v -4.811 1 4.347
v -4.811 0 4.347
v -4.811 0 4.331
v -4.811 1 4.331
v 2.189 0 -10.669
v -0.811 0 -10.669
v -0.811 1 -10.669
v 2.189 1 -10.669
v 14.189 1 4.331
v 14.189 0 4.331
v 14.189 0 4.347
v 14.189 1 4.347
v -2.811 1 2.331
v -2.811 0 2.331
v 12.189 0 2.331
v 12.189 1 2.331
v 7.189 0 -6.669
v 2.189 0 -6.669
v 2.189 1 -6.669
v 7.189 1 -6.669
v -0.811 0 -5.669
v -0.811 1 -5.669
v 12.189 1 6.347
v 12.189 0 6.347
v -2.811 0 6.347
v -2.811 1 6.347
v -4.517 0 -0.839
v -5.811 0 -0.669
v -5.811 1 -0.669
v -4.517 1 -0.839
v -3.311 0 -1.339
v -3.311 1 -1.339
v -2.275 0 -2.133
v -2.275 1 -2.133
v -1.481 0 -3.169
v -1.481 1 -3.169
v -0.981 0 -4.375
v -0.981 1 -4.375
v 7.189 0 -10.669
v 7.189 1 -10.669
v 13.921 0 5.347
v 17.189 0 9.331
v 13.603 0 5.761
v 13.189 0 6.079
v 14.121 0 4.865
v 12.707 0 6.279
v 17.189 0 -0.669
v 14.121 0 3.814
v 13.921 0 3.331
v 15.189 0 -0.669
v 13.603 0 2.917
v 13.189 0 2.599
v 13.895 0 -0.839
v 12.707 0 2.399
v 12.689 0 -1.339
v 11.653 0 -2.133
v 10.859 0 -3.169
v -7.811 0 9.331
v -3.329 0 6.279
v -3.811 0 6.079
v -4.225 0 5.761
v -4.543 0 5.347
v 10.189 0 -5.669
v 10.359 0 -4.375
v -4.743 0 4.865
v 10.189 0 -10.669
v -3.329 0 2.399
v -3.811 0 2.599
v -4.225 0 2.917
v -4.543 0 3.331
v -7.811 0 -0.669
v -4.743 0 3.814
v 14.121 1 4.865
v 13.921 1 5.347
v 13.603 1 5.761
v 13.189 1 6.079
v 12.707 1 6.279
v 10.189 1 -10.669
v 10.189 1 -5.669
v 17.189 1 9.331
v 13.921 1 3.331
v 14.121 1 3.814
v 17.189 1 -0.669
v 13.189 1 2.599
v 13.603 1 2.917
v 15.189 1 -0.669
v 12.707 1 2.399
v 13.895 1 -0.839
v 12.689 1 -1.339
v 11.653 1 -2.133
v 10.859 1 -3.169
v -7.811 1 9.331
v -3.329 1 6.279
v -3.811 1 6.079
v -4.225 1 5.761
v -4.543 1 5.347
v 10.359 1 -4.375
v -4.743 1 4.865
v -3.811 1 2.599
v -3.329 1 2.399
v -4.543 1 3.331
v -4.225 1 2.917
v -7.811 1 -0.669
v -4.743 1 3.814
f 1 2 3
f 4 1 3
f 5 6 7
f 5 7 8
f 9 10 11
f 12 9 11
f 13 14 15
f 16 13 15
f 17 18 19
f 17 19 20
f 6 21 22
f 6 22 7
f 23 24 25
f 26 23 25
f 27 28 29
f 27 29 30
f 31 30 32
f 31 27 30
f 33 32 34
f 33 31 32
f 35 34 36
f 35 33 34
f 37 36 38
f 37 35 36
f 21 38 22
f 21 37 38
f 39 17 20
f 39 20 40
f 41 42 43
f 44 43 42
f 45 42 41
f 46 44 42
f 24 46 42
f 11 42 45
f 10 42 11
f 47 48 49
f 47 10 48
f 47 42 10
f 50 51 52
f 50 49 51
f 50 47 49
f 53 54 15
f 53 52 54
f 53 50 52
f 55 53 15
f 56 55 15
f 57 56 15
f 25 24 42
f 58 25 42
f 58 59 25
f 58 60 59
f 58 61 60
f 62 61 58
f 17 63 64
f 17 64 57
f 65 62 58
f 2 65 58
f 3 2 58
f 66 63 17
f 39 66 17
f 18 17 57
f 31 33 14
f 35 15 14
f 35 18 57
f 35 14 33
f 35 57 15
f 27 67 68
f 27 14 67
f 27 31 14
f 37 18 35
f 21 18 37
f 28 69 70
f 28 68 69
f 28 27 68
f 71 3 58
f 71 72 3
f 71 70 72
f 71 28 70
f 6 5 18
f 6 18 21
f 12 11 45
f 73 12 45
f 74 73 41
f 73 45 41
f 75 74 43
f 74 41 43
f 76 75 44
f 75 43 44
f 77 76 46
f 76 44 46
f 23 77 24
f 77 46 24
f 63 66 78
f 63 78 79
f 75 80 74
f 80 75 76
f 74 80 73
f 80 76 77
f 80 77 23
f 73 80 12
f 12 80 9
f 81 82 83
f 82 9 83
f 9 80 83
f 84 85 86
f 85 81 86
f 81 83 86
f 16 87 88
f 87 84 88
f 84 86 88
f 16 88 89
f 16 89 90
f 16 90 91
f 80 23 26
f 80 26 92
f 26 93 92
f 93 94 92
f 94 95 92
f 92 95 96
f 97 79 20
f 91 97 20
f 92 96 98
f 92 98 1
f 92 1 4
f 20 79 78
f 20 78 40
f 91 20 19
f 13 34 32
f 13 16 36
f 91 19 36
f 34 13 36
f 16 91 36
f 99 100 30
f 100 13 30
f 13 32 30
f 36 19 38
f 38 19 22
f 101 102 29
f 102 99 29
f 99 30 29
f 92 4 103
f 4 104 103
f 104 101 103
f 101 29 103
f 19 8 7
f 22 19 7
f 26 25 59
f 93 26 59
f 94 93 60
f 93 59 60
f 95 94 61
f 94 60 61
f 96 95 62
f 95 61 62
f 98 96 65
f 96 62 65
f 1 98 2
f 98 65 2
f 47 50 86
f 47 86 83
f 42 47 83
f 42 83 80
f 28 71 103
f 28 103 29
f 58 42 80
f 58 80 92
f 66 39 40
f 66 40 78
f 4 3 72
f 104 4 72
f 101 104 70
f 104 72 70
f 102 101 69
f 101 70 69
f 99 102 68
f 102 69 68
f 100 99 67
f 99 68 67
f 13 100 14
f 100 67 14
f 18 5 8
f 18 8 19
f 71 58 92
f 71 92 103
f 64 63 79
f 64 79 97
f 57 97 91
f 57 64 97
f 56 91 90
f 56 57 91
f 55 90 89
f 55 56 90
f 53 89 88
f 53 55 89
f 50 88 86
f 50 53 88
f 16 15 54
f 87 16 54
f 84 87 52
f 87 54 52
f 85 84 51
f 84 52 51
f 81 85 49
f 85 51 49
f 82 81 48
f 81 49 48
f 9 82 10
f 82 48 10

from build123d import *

# Parameters (mm, degrees)
BOSS_EXTRUDE1_DEPTH = 1


with BuildPart() as part:
    # Sketch1 → Boss-Extrude1 (new body)
    with BuildSketch(Plane(origin=(0, 0, 0), x_dir=(1, 0, 0), z_dir=(0, 1, 0))):
        with BuildLine():
            Line((-0.811022124, 5.668679597), (-0.811022124, 10.668679597))
            Line((-0.811022124, 10.668679597), (2.188977876, 10.668679597))
            Line((2.188977876, 10.668679597), (2.188977876, 6.668679597))
            Line((2.188977876, 6.668679597), (7.188977876, 6.668679597))
            Line((7.188977876, 6.668679597), (7.188977876, 10.668679597))
            Line((7.188977876, 10.668679597), (10.188977876, 10.668679597))
            Line((10.188977876, 10.668679597), (10.188977876, 5.668679597))
            ThreePointArc((10.188977876, 5.668679597), (11.65344397, 2.133145691), (15.188977876, 0.668679597))
            Line((15.188977876, 0.668679597), (17.188977876, 0.668679597))
            Line((17.188977876, 0.668679597), (17.188977876, -9.331320403))
            Line((17.188977876, -9.331320403), (-7.811022124, -9.331320403))
            Line((-7.811022124, -9.331320403), (-7.811022124, 0.668679597))
            Line((-7.811022124, 0.668679597), (-5.811022124, 0.668679597))
            ThreePointArc((-5.811022124, 0.668679597), (-2.275488218, 2.133145691), (-0.811022124, 5.668679597))
        make_face()
        with BuildLine():
            Line((-2.811022124, -2.331320403), (12.188977876, -2.331320403))
            ThreePointArc((12.188977876, -2.331320403), (13.603191438, -2.917106841), (14.188977876, -4.331320403))
            Line((14.188977876, -4.331320403), (14.188977876, -4.346932121))
            ThreePointArc((14.188977876, -4.346932121), (13.603191438, -5.761145684), (12.188977876, -6.346932121))
            Line((12.188977876, -6.346932121), (-2.811022124, -6.346932121))
            ThreePointArc((-2.811022124, -6.346932121), (-4.225235686, -5.761145684), (-4.811022124, -4.346932121))
            Line((-4.811022124, -4.346932121), (-4.811022124, -4.331320403))
            ThreePointArc((-4.811022124, -4.331320403), (-4.225235686, -2.917106841), (-2.811022124, -2.331320403))
        make_face(mode=Mode.SUBTRACT)
    extrude(amount=BOSS_EXTRUDE1_DEPTH)


solid = part.part
